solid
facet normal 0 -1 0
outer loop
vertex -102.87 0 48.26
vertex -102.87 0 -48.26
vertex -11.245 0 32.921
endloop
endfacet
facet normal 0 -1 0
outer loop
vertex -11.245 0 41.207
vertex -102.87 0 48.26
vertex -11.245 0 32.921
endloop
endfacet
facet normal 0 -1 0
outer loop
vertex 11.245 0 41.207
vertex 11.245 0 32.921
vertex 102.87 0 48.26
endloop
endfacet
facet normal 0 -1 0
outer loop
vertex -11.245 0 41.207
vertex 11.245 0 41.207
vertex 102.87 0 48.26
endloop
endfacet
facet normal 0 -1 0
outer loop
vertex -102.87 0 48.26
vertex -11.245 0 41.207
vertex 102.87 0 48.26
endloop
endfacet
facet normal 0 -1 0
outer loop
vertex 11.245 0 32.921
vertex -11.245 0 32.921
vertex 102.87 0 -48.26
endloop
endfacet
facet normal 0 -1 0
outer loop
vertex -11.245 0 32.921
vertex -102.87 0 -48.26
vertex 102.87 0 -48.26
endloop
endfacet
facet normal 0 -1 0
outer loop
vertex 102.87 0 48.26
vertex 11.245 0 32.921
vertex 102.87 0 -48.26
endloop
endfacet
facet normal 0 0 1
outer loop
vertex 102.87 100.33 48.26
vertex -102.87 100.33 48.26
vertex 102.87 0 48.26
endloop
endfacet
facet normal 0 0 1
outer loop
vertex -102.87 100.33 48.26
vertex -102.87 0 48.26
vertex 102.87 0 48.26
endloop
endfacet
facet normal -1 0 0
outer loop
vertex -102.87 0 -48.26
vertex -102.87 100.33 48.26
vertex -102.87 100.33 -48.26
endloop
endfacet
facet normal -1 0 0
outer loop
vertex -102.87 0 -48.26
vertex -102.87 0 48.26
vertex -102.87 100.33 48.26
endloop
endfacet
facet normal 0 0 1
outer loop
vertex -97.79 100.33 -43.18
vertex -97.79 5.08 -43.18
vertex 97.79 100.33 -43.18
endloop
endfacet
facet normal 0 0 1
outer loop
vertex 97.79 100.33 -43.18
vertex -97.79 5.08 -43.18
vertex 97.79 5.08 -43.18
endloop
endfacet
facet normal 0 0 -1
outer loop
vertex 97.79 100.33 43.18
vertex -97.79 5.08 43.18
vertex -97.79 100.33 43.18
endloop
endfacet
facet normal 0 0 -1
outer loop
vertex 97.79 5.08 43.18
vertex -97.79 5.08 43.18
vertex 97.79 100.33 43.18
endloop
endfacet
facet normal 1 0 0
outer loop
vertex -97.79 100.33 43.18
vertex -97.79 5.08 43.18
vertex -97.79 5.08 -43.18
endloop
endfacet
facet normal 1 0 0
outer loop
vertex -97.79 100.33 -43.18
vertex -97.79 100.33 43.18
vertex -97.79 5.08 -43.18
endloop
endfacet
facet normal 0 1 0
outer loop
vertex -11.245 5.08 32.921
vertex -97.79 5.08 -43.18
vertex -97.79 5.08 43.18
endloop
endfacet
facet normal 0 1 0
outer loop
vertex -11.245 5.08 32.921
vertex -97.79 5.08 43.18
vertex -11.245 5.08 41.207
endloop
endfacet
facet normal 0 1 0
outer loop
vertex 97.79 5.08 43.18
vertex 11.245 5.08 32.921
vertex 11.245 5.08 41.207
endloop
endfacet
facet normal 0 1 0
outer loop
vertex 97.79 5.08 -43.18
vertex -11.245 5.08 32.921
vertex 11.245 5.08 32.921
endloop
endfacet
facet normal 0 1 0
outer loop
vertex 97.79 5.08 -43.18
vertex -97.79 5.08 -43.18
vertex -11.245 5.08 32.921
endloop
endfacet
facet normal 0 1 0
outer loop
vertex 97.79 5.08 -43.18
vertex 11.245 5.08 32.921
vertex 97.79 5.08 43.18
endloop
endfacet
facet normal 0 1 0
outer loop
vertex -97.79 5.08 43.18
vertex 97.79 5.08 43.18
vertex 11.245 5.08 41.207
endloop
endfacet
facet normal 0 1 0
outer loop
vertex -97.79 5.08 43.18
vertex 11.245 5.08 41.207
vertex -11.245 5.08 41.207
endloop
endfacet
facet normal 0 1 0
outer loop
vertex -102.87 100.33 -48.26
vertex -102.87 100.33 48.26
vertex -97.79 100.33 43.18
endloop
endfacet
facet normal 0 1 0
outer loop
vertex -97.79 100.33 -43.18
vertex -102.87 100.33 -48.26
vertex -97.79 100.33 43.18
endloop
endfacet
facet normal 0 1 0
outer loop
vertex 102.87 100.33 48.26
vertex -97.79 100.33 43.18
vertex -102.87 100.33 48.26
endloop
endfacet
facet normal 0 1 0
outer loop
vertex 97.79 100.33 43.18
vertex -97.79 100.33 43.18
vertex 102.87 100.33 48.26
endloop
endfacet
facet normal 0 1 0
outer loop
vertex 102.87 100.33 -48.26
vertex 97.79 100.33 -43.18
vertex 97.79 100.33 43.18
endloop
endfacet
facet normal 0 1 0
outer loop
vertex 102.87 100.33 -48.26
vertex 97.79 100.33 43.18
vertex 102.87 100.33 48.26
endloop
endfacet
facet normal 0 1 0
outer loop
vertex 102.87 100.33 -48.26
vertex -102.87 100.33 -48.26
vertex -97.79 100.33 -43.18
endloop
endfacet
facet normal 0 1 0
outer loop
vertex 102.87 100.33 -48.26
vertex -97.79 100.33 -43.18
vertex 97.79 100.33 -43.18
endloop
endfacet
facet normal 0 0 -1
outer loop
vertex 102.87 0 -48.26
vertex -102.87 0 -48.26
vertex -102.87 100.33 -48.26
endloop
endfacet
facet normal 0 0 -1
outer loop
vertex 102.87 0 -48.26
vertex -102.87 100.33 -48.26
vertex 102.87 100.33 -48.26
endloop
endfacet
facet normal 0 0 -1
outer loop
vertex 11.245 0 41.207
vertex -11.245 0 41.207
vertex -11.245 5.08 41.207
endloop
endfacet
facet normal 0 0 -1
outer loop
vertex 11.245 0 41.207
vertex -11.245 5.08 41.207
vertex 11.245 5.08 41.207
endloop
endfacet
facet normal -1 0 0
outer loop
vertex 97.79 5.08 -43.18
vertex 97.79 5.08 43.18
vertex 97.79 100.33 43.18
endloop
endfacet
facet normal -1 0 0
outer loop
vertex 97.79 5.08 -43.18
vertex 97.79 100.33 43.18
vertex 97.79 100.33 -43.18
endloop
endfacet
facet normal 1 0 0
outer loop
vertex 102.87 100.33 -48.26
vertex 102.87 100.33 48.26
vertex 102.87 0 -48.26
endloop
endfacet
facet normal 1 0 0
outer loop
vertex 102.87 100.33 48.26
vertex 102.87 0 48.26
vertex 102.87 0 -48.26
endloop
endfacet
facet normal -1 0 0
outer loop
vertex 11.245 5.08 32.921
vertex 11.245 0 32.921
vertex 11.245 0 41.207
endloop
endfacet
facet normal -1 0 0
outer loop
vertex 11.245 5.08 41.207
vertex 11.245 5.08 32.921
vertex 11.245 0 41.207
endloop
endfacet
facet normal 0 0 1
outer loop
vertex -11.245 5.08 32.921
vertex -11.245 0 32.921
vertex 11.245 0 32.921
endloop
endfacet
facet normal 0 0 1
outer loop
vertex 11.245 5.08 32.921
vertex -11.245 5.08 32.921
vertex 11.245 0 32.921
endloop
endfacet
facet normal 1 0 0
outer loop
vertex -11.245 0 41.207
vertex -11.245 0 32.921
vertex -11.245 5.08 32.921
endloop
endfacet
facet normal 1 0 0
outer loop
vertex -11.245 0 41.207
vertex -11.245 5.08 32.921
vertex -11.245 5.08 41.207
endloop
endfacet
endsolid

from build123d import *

# Parameters (mm, degrees)
SKETCH2_W           = 205.74
SKETCH2_H           = 96.52
BOSS_EXTRUDE1_DEPTH = 5.08
SKETCH3_W           = 205.74
SKETCH3_H           = 96.52
SKETCH3_W_2         = 195.58
SKETCH3_H_2         = 86.36
BOSS_EXTRUDE2_DEPTH = 95.25
SKETCH5_W           = 22.490008116
SKETCH5_H           = 8.285792463
CUT_EXTRUDE1_DEPTH  = 95.25


with BuildPart() as part:
    # Sketch2 → Boss-Extrude1 (new body)
    with BuildSketch(Plane(origin=(0, 0, 0), x_dir=(1, 0, 0), z_dir=(0, 1, 0))):
        Rectangle(SKETCH2_W, SKETCH2_H)
    extrude(amount=BOSS_EXTRUDE1_DEPTH)

    # Sketch3 → Boss-Extrude2 (add)
    with BuildSketch(Plane(origin=(0, 5.08, 0), x_dir=(1, 0, 0), z_dir=(0, 1, 0))):
        Rectangle(SKETCH3_W, SKETCH3_H)
        Rectangle(SKETCH3_W_2, SKETCH3_H_2, mode=Mode.SUBTRACT)
    extrude(amount=BOSS_EXTRUDE2_DEPTH)

    # Sketch5 → Cut-Extrude1 (cut)
    with BuildSketch(Plane.XZ):
        with Locations((0, 37.064125217)):
            Rectangle(SKETCH5_W, SKETCH5_H)
    extrude(amount=-CUT_EXTRUDE1_DEPTH, mode=Mode.SUBTRACT)


solid = part.part
